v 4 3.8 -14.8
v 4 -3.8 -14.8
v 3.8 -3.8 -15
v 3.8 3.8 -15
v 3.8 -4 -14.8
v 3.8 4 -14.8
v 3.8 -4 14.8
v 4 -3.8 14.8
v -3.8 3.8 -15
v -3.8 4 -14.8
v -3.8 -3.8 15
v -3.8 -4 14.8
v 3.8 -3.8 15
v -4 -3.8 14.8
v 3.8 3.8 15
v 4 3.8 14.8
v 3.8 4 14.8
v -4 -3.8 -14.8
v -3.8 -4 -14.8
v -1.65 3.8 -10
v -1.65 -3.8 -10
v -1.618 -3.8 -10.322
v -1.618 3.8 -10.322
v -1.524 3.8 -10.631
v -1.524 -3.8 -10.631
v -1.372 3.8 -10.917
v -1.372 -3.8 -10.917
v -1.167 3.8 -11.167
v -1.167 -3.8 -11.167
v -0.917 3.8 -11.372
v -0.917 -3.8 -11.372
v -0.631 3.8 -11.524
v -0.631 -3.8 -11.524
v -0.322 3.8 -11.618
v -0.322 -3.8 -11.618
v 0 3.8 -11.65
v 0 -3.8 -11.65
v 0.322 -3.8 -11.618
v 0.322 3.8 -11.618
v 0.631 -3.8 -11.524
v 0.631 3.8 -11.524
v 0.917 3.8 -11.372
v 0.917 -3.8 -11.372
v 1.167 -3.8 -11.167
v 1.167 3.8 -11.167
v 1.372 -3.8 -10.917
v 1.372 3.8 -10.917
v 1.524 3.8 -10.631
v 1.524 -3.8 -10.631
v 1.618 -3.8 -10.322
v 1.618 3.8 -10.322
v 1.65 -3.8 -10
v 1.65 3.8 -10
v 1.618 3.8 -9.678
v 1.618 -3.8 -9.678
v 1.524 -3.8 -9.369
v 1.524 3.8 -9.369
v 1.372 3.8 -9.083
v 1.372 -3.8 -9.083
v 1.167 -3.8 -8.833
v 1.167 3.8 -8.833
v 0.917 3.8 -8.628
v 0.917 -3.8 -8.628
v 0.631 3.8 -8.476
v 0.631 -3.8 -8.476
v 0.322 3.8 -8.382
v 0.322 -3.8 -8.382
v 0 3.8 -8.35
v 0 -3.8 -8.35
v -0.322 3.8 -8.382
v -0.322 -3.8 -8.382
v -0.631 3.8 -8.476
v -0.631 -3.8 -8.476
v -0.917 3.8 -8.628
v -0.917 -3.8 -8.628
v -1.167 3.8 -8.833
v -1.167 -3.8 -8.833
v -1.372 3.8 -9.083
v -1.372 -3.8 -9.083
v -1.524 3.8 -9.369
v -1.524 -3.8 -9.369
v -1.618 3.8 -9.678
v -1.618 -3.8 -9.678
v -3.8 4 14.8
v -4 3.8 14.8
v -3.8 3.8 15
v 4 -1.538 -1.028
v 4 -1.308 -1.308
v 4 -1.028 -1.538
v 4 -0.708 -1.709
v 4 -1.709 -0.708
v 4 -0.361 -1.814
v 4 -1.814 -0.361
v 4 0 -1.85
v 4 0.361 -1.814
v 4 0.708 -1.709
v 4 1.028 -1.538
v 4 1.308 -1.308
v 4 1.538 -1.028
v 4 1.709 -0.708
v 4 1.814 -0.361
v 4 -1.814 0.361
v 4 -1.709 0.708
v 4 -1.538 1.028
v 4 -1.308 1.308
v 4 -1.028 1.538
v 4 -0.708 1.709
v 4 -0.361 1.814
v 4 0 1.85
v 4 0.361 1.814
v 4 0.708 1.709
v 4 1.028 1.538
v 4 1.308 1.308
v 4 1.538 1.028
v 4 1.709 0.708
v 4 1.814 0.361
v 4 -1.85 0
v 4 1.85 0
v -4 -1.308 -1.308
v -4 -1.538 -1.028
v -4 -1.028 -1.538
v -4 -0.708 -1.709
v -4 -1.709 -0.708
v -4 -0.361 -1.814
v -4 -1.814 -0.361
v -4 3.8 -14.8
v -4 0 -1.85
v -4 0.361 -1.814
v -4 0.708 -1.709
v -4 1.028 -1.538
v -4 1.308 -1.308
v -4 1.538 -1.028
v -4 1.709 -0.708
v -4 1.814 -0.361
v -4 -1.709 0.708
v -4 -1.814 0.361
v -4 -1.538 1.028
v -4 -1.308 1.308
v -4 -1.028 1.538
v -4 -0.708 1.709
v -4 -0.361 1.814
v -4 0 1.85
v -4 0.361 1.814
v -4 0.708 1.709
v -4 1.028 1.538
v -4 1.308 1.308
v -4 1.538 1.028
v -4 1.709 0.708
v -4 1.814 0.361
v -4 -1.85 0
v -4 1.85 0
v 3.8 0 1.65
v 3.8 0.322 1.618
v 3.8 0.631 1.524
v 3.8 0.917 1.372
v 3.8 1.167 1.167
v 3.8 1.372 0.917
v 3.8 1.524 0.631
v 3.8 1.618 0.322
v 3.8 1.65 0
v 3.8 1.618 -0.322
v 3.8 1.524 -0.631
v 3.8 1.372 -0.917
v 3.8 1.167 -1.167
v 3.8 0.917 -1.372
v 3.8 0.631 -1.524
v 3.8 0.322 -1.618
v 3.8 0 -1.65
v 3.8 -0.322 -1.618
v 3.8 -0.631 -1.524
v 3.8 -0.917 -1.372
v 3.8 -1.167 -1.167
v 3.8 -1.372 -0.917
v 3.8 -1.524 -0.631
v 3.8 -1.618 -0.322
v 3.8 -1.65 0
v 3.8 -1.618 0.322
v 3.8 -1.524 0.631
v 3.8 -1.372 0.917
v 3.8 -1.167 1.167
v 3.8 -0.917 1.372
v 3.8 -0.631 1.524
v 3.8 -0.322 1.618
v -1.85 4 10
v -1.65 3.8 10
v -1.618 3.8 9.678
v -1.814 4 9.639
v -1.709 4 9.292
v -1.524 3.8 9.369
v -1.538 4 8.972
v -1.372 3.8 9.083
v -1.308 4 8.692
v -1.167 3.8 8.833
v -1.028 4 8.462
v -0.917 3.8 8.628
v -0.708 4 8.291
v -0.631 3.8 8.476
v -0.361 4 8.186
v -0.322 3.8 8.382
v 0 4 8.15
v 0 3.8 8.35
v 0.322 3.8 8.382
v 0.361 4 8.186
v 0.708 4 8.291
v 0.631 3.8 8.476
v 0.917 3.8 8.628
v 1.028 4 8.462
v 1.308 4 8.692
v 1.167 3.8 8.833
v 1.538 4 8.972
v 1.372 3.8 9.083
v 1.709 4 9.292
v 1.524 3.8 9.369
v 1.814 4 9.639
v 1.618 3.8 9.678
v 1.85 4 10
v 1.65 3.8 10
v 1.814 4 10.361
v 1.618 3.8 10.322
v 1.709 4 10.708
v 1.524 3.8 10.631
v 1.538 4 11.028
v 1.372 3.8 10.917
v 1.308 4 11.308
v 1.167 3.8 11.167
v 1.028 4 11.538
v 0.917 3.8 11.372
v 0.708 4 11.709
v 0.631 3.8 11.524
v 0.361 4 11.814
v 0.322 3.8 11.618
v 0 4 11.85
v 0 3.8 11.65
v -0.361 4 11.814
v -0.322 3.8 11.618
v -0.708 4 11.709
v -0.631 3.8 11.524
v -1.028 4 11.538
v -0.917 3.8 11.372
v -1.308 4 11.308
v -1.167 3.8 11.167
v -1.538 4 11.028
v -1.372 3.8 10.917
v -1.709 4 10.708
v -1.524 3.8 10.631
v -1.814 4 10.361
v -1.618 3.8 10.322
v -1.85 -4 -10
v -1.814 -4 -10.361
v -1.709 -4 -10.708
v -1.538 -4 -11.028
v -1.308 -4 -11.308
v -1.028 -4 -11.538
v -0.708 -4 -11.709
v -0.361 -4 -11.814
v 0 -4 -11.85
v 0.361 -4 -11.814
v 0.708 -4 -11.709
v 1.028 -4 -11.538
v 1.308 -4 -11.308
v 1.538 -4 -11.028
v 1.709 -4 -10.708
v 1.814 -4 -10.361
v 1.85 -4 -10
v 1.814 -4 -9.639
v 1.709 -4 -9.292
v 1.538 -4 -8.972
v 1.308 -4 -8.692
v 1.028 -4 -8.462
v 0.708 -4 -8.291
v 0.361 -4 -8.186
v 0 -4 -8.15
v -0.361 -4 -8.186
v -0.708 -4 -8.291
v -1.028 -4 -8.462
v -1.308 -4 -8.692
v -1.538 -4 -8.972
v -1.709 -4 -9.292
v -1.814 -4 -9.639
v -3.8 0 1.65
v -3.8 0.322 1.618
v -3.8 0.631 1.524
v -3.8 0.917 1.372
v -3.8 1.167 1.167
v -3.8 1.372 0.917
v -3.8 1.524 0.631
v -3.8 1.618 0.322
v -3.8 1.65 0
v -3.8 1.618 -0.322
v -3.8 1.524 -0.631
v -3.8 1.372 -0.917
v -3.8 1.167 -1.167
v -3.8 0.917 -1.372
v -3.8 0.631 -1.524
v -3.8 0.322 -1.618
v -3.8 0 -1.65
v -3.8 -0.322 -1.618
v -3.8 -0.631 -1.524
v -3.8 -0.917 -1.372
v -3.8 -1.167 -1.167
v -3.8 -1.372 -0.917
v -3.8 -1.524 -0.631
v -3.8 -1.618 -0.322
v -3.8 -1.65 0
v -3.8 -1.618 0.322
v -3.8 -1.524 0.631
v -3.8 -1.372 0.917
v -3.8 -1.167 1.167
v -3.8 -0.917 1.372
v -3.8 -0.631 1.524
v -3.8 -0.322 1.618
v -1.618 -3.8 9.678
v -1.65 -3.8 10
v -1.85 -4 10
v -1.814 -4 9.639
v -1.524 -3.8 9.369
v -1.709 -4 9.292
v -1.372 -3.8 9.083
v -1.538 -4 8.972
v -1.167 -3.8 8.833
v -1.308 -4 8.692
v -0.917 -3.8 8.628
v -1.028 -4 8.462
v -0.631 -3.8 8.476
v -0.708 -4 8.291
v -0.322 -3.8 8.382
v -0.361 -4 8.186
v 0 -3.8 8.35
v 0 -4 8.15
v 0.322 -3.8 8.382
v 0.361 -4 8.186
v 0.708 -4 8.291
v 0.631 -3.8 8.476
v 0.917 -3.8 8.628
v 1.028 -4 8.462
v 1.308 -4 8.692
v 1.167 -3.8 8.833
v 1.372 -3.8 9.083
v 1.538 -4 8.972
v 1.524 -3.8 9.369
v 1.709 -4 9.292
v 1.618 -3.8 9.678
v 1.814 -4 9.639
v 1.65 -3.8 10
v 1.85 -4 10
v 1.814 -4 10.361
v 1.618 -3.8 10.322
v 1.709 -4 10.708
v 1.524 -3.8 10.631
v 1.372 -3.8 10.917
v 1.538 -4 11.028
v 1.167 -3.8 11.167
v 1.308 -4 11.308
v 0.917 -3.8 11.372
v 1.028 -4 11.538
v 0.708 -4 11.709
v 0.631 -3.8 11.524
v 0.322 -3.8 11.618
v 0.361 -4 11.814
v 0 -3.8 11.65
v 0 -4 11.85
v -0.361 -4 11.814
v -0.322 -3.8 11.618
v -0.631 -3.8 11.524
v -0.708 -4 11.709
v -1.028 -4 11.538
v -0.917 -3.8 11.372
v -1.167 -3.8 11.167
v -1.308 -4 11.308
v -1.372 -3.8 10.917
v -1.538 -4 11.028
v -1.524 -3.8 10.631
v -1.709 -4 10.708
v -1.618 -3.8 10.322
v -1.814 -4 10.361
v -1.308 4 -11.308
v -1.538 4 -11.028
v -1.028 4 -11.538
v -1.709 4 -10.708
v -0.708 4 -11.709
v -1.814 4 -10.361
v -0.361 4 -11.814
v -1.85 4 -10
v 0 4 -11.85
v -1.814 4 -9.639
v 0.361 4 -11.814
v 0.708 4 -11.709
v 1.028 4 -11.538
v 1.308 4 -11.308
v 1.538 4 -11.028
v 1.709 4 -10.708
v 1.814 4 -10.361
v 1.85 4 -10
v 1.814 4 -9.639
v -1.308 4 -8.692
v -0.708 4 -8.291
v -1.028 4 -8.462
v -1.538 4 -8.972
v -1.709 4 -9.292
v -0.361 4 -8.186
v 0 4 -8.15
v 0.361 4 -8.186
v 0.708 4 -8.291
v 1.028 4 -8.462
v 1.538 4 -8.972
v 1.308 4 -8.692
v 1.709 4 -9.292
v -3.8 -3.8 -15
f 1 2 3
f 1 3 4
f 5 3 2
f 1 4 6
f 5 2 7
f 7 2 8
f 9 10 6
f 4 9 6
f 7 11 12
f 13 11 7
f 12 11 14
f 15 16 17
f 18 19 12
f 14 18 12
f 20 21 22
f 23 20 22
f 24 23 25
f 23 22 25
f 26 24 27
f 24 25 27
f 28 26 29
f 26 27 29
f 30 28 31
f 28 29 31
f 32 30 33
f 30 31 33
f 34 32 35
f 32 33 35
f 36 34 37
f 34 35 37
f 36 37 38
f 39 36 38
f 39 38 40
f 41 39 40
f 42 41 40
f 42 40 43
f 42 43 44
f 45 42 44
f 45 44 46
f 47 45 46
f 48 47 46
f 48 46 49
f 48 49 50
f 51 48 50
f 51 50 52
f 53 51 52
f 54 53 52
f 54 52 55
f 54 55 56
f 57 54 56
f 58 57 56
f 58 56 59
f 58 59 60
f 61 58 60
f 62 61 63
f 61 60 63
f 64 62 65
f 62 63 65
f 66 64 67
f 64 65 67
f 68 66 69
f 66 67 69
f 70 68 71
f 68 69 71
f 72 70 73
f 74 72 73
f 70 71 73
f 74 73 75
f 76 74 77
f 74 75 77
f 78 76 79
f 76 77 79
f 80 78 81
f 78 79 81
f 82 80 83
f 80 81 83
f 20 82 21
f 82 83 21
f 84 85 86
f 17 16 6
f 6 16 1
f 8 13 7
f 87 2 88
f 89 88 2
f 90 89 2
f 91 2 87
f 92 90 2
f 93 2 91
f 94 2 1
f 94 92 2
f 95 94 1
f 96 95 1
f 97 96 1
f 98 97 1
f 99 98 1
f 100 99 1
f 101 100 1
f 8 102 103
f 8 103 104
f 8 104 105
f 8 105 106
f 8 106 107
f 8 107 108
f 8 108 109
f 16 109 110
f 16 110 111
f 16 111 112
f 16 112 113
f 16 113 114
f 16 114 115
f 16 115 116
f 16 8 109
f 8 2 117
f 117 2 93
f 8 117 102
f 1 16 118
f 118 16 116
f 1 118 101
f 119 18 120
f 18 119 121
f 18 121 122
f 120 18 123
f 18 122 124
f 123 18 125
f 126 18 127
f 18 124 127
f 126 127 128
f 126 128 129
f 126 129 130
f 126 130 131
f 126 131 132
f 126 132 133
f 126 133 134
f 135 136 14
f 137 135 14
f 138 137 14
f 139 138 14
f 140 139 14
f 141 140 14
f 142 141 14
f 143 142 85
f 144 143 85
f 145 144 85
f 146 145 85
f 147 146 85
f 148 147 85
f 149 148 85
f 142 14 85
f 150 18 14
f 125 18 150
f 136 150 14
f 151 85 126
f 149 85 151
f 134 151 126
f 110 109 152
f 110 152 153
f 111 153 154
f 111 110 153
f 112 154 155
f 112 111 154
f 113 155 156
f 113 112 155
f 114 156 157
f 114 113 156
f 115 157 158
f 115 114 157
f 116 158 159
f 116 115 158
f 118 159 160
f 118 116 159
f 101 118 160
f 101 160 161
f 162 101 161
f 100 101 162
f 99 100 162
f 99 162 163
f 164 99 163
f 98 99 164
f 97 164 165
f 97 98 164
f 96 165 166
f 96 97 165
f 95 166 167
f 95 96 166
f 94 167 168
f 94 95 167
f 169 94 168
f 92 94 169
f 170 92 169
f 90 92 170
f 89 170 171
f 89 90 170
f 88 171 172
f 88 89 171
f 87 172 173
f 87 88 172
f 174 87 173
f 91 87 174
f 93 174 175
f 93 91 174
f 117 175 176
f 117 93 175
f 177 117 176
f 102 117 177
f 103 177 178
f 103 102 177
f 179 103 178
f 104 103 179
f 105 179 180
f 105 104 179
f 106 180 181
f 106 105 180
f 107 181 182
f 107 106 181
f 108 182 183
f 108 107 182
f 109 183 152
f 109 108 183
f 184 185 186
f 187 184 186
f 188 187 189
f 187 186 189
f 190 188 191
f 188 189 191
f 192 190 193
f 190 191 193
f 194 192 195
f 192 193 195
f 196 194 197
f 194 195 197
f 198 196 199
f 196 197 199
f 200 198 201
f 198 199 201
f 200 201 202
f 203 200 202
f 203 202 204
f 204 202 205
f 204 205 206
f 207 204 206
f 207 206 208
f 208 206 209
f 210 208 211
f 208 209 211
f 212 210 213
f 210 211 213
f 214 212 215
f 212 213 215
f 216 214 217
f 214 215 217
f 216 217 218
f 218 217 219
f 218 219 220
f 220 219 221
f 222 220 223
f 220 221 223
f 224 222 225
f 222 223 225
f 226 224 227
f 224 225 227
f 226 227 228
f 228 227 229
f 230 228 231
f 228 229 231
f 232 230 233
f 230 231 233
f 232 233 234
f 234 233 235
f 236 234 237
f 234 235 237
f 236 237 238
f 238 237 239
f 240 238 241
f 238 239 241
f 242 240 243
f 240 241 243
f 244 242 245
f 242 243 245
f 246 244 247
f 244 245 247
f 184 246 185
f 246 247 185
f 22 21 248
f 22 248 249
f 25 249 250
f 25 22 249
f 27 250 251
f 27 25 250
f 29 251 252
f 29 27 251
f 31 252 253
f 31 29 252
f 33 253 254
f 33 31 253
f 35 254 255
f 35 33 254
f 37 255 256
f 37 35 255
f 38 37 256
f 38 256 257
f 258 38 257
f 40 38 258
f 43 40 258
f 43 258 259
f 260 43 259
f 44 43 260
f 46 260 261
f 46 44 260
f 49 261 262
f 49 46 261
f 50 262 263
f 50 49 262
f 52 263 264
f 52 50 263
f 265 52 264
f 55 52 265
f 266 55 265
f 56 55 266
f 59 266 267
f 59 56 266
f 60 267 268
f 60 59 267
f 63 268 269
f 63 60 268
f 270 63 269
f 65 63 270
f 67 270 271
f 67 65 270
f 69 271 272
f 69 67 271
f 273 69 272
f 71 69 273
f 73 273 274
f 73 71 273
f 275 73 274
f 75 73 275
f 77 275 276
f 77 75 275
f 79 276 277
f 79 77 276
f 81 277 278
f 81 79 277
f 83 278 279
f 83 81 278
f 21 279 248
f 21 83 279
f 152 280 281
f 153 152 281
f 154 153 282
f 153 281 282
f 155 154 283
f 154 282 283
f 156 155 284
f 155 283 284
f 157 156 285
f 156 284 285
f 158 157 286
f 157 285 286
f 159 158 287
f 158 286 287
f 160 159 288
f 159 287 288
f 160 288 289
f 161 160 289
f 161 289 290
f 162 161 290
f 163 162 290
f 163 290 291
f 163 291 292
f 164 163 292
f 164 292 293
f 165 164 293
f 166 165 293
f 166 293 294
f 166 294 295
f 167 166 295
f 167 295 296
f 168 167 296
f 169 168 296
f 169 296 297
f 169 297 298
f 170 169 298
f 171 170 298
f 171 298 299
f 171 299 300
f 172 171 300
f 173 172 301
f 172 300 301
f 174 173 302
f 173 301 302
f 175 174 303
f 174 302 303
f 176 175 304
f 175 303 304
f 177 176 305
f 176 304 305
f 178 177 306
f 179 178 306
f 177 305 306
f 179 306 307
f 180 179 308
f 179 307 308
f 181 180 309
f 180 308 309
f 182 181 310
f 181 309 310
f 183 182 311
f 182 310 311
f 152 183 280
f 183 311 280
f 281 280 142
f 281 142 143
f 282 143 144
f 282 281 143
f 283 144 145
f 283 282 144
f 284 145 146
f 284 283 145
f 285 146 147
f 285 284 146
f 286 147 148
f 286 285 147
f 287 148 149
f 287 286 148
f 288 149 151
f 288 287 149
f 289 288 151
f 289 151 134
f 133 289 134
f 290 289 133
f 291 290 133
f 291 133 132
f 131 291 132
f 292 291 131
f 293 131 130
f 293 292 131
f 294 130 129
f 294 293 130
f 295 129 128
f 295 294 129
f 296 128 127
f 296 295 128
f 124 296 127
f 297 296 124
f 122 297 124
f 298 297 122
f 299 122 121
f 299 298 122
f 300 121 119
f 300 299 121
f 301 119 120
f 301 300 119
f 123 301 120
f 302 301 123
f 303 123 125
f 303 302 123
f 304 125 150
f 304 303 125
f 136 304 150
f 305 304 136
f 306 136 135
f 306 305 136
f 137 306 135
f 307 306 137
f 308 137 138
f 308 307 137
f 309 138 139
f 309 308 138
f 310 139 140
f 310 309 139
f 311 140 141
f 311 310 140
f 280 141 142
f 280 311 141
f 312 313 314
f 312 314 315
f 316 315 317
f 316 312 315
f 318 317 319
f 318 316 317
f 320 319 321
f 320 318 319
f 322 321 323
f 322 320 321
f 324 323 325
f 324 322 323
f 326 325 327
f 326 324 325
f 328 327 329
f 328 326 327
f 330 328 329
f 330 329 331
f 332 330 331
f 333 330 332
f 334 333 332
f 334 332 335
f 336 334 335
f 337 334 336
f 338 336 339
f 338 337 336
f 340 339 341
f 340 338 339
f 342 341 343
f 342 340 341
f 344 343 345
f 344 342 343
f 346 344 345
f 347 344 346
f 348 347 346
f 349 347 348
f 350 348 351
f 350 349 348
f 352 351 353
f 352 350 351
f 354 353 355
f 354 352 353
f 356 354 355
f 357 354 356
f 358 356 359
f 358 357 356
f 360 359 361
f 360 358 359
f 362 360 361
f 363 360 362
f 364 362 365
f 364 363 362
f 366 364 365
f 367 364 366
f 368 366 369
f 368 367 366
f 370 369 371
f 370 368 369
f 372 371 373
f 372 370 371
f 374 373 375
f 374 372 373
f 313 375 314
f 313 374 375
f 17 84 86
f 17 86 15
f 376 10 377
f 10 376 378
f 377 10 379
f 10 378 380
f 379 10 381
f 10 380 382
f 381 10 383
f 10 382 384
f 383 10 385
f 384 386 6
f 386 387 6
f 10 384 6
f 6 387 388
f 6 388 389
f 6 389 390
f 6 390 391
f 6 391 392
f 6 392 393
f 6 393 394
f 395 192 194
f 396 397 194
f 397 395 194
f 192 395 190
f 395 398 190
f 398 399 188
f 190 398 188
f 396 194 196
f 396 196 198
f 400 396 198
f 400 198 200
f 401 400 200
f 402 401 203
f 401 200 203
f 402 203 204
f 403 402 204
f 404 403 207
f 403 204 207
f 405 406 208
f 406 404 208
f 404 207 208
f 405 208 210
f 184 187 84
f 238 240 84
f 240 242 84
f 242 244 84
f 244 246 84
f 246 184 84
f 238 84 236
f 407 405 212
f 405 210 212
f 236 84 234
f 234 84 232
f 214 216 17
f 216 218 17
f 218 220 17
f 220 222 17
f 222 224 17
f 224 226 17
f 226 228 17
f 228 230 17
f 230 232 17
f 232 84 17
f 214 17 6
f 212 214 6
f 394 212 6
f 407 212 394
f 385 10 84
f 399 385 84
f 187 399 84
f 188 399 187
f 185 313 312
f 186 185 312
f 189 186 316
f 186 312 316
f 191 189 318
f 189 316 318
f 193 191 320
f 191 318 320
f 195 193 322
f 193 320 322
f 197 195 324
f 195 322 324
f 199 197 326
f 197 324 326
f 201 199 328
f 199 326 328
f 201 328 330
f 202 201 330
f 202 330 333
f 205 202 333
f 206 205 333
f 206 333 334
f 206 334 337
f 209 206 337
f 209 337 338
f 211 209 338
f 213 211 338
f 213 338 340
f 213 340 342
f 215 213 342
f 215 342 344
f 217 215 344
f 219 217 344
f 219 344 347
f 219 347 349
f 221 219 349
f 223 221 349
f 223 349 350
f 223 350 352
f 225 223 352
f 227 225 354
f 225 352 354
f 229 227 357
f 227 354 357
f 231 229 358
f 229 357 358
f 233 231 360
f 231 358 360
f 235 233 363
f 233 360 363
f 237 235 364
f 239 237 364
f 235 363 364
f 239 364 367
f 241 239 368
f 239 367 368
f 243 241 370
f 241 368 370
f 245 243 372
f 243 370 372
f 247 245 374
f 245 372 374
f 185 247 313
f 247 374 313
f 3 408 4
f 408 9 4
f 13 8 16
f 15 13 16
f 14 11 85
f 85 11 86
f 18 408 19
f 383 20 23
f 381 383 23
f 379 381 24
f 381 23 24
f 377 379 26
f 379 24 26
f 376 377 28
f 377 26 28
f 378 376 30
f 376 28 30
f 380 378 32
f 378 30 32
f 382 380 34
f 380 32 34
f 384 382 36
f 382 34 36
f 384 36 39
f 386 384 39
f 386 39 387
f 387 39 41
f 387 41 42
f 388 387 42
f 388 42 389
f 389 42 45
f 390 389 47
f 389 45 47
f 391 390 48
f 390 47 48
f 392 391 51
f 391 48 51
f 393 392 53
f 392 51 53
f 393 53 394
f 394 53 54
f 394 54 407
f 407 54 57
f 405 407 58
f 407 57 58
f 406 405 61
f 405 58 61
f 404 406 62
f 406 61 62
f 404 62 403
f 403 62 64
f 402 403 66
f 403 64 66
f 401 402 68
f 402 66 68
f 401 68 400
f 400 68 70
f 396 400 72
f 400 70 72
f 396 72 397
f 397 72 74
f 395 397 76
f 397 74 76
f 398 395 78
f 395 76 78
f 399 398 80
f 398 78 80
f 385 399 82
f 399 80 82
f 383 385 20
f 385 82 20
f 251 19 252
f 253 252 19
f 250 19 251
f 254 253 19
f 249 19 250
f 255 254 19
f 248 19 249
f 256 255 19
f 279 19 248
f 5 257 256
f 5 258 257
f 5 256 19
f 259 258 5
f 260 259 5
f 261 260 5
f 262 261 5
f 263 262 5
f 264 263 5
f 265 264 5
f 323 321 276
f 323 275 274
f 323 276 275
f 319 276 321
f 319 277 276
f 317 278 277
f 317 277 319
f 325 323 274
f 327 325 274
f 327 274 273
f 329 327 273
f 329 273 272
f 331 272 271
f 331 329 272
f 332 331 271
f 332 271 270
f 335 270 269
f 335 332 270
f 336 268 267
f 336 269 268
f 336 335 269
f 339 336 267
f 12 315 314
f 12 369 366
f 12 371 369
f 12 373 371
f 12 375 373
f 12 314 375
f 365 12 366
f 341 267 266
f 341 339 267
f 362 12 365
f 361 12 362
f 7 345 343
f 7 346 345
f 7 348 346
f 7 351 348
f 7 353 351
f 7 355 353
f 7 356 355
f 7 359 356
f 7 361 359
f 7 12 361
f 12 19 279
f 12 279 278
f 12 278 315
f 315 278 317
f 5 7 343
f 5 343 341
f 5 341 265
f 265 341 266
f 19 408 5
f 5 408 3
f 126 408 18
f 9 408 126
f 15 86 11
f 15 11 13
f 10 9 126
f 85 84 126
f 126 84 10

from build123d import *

# Parameters (mm, degrees)
SKETCH_1_W         = 8
SKETCH_1_H         = 8
EXTRUDE_1_DEPTH    = 15
HOLE_WIZARD_M4_1_D = 3.3
HOLE_WIZARD_M4_2_D = 3.3
CHAMFER_1_SIZE     = 0.2


with BuildPart() as part:
    # 草图1 → 凸台-拉伸1 (new, symmetric)
    with BuildSketch(Plane.XY):
        Rectangle(SKETCH_1_W, SKETCH_1_H)
    extrude(amount=EXTRUDE_1_DEPTH, both=True)

    # M4 螺纹孔1 (through all)
    with Locations(Plane(origin=(4, 0, 0), x_dir=(0, 0, -1), z_dir=(1, 0, 0))):
        with Locations((0, 0)):
            Hole(HOLE_WIZARD_M4_1_D / 2)

    # M4 螺纹孔2 (through all)
    with Locations(Plane(origin=(0, 4, 0), x_dir=(1, 0, 0), z_dir=(0, 1, 0))):
        with Locations((0, -10), (0, 10)):
            Hole(HOLE_WIZARD_M4_2_D / 2)

    # 倒角1
    chamfer_1_edges = [part.edges().sort_by_distance(p)[0] for p in [
        (-4, 0, 15),
        (4, 0, -1.65),
        (-4, 0, -1.65),
        (0, -4, 15),
        (1.65, 4, -10),
        (1.65, -4, -10),
        (1.65, 4, 10),
        (1.65, -4, 10),
        (4, 0, 15),
        (0, -4, -15),
        (-4, 0, -15),
        (0, 4, -15),
        (4, 0, -15),
        (4, -4, 0),
        (-4, -4, 0),
        (-4, 4, 0),
        (4, 4, 0),
        (0, 4, 15),
    ]]
    chamfer(chamfer_1_edges, length=CHAMFER_1_SIZE)


solid = part.part
